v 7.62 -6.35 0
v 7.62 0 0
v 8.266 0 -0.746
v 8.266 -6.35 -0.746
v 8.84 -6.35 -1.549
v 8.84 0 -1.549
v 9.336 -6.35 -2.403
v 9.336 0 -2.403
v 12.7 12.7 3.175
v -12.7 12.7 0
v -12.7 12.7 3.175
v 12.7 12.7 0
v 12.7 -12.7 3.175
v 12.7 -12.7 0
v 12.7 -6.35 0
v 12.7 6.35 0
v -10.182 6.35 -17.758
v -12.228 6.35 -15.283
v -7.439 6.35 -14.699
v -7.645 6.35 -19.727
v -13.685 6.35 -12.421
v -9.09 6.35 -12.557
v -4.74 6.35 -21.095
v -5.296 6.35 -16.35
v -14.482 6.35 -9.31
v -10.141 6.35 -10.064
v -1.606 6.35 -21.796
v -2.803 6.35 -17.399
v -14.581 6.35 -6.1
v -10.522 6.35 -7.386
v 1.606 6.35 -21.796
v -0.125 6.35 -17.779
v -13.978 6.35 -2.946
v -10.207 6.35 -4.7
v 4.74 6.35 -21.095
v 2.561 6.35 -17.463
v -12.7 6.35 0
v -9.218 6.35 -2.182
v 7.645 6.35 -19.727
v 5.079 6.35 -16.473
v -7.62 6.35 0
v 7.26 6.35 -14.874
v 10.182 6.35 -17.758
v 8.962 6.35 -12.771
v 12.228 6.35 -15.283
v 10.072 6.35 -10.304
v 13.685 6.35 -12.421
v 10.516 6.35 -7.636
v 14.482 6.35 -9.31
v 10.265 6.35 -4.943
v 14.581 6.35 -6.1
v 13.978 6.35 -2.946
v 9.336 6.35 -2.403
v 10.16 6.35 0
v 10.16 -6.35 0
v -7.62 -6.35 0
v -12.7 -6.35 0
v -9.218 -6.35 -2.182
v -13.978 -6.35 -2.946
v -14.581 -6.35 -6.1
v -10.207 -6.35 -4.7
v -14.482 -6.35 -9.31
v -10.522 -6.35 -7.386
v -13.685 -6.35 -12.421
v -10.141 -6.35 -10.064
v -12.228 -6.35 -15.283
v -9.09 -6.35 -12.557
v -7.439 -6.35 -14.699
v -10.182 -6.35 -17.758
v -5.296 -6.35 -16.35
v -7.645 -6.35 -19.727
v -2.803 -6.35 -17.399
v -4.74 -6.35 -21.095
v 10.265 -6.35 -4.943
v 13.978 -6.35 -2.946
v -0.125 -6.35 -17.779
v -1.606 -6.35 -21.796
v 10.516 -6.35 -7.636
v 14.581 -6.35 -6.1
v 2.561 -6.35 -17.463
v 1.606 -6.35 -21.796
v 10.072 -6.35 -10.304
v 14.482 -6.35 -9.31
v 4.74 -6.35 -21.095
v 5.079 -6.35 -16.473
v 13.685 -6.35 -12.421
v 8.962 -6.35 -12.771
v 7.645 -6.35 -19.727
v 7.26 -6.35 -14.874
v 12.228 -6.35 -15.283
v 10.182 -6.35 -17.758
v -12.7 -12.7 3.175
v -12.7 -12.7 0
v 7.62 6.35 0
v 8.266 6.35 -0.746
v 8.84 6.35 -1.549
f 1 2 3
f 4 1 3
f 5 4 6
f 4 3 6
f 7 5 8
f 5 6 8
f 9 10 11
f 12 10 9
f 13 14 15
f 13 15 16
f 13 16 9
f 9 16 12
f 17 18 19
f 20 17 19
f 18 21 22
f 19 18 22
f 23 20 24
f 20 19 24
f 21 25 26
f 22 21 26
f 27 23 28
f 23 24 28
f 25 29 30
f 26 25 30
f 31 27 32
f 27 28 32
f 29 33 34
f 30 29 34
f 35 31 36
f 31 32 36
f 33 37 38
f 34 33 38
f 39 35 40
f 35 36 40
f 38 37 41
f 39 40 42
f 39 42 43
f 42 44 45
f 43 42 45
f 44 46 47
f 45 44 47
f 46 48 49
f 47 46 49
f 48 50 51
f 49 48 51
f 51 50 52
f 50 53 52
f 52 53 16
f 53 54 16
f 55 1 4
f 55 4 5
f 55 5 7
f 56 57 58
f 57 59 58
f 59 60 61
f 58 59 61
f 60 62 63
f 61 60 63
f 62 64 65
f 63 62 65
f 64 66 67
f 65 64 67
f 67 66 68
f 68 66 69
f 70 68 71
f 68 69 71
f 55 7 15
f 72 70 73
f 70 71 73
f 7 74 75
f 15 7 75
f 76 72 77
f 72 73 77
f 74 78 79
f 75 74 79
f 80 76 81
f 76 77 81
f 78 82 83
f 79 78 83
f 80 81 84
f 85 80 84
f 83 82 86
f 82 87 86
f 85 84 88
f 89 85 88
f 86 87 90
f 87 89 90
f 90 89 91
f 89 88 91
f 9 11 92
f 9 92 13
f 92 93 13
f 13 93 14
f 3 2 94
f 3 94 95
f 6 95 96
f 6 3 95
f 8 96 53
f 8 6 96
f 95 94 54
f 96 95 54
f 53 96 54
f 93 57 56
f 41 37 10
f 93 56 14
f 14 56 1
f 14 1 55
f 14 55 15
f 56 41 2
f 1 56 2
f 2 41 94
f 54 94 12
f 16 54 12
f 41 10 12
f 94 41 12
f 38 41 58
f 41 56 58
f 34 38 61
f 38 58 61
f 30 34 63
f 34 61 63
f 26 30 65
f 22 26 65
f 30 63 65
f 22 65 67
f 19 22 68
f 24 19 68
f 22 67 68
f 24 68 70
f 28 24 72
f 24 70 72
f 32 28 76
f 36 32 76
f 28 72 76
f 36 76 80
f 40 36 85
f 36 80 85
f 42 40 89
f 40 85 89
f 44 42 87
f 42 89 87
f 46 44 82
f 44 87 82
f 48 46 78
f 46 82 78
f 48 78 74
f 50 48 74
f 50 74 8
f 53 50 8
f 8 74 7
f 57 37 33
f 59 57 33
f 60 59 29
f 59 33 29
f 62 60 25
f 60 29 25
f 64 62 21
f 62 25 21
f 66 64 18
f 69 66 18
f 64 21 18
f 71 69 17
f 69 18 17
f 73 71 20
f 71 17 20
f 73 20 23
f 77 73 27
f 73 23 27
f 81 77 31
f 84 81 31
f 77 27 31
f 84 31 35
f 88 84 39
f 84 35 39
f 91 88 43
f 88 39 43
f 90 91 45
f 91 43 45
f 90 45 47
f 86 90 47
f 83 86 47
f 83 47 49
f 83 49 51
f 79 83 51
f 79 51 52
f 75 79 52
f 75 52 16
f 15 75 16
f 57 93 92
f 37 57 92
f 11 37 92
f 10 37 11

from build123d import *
from build123d import SkipClean  # not in build123d's __all__

# Parameters (mm, degrees)
F0_W          = 25.4
F0_H          = 25.4
F1_DEPTH      = 3.175
F3_W          = 5.08
F3_H          = 12.7
F6_DEPTH      = 6.35
F6_DEPTH_BACK = 6.35


with BuildPart() as f1:
    # F0 (on Top) → F1 (new body)
    with BuildSketch(Plane.XY):
        Rectangle(F0_W, F0_H)
    extrude(amount=F1_DEPTH)

    # F4: sweep along a path in F2
    with BuildLine(Plane.XZ) as f4_path:
        ThreePointArc((-10.16, 0), (0, -19.7423783289), (10.16, 0))
    # F3 (on face) → F4 (sweep)
    with BuildSketch(Plane(origin=(0, 0, 0), x_dir=(1, 0, 0), z_dir=(0, 0, -1))):
        with Locations((-10.16, 0)):
            Rectangle(F3_W, F3_H)
    sweep(path=f4_path.line)

    # F5 (on Front) → F6 (join, two sides)
    with BuildSketch(Plane.XZ) as f6_sk:
        with BuildLine():
            Line((9.3361319986, -2.4026738264), (10.16, 0))
            Line((10.16, 0), (7.62, 0))
            ThreePointArc((7.62, 0), (8.5627573519, -1.1408453315), (9.3361319986, -2.4026738264))
        make_face()
    with SkipClean():  # cleaning this boolean's faces spoils the solid; the shape is the same uncleaned
        extrude(amount=F6_DEPTH)
        extrude(f6_sk.sketch, amount=-F6_DEPTH_BACK)


solid = f1.part
